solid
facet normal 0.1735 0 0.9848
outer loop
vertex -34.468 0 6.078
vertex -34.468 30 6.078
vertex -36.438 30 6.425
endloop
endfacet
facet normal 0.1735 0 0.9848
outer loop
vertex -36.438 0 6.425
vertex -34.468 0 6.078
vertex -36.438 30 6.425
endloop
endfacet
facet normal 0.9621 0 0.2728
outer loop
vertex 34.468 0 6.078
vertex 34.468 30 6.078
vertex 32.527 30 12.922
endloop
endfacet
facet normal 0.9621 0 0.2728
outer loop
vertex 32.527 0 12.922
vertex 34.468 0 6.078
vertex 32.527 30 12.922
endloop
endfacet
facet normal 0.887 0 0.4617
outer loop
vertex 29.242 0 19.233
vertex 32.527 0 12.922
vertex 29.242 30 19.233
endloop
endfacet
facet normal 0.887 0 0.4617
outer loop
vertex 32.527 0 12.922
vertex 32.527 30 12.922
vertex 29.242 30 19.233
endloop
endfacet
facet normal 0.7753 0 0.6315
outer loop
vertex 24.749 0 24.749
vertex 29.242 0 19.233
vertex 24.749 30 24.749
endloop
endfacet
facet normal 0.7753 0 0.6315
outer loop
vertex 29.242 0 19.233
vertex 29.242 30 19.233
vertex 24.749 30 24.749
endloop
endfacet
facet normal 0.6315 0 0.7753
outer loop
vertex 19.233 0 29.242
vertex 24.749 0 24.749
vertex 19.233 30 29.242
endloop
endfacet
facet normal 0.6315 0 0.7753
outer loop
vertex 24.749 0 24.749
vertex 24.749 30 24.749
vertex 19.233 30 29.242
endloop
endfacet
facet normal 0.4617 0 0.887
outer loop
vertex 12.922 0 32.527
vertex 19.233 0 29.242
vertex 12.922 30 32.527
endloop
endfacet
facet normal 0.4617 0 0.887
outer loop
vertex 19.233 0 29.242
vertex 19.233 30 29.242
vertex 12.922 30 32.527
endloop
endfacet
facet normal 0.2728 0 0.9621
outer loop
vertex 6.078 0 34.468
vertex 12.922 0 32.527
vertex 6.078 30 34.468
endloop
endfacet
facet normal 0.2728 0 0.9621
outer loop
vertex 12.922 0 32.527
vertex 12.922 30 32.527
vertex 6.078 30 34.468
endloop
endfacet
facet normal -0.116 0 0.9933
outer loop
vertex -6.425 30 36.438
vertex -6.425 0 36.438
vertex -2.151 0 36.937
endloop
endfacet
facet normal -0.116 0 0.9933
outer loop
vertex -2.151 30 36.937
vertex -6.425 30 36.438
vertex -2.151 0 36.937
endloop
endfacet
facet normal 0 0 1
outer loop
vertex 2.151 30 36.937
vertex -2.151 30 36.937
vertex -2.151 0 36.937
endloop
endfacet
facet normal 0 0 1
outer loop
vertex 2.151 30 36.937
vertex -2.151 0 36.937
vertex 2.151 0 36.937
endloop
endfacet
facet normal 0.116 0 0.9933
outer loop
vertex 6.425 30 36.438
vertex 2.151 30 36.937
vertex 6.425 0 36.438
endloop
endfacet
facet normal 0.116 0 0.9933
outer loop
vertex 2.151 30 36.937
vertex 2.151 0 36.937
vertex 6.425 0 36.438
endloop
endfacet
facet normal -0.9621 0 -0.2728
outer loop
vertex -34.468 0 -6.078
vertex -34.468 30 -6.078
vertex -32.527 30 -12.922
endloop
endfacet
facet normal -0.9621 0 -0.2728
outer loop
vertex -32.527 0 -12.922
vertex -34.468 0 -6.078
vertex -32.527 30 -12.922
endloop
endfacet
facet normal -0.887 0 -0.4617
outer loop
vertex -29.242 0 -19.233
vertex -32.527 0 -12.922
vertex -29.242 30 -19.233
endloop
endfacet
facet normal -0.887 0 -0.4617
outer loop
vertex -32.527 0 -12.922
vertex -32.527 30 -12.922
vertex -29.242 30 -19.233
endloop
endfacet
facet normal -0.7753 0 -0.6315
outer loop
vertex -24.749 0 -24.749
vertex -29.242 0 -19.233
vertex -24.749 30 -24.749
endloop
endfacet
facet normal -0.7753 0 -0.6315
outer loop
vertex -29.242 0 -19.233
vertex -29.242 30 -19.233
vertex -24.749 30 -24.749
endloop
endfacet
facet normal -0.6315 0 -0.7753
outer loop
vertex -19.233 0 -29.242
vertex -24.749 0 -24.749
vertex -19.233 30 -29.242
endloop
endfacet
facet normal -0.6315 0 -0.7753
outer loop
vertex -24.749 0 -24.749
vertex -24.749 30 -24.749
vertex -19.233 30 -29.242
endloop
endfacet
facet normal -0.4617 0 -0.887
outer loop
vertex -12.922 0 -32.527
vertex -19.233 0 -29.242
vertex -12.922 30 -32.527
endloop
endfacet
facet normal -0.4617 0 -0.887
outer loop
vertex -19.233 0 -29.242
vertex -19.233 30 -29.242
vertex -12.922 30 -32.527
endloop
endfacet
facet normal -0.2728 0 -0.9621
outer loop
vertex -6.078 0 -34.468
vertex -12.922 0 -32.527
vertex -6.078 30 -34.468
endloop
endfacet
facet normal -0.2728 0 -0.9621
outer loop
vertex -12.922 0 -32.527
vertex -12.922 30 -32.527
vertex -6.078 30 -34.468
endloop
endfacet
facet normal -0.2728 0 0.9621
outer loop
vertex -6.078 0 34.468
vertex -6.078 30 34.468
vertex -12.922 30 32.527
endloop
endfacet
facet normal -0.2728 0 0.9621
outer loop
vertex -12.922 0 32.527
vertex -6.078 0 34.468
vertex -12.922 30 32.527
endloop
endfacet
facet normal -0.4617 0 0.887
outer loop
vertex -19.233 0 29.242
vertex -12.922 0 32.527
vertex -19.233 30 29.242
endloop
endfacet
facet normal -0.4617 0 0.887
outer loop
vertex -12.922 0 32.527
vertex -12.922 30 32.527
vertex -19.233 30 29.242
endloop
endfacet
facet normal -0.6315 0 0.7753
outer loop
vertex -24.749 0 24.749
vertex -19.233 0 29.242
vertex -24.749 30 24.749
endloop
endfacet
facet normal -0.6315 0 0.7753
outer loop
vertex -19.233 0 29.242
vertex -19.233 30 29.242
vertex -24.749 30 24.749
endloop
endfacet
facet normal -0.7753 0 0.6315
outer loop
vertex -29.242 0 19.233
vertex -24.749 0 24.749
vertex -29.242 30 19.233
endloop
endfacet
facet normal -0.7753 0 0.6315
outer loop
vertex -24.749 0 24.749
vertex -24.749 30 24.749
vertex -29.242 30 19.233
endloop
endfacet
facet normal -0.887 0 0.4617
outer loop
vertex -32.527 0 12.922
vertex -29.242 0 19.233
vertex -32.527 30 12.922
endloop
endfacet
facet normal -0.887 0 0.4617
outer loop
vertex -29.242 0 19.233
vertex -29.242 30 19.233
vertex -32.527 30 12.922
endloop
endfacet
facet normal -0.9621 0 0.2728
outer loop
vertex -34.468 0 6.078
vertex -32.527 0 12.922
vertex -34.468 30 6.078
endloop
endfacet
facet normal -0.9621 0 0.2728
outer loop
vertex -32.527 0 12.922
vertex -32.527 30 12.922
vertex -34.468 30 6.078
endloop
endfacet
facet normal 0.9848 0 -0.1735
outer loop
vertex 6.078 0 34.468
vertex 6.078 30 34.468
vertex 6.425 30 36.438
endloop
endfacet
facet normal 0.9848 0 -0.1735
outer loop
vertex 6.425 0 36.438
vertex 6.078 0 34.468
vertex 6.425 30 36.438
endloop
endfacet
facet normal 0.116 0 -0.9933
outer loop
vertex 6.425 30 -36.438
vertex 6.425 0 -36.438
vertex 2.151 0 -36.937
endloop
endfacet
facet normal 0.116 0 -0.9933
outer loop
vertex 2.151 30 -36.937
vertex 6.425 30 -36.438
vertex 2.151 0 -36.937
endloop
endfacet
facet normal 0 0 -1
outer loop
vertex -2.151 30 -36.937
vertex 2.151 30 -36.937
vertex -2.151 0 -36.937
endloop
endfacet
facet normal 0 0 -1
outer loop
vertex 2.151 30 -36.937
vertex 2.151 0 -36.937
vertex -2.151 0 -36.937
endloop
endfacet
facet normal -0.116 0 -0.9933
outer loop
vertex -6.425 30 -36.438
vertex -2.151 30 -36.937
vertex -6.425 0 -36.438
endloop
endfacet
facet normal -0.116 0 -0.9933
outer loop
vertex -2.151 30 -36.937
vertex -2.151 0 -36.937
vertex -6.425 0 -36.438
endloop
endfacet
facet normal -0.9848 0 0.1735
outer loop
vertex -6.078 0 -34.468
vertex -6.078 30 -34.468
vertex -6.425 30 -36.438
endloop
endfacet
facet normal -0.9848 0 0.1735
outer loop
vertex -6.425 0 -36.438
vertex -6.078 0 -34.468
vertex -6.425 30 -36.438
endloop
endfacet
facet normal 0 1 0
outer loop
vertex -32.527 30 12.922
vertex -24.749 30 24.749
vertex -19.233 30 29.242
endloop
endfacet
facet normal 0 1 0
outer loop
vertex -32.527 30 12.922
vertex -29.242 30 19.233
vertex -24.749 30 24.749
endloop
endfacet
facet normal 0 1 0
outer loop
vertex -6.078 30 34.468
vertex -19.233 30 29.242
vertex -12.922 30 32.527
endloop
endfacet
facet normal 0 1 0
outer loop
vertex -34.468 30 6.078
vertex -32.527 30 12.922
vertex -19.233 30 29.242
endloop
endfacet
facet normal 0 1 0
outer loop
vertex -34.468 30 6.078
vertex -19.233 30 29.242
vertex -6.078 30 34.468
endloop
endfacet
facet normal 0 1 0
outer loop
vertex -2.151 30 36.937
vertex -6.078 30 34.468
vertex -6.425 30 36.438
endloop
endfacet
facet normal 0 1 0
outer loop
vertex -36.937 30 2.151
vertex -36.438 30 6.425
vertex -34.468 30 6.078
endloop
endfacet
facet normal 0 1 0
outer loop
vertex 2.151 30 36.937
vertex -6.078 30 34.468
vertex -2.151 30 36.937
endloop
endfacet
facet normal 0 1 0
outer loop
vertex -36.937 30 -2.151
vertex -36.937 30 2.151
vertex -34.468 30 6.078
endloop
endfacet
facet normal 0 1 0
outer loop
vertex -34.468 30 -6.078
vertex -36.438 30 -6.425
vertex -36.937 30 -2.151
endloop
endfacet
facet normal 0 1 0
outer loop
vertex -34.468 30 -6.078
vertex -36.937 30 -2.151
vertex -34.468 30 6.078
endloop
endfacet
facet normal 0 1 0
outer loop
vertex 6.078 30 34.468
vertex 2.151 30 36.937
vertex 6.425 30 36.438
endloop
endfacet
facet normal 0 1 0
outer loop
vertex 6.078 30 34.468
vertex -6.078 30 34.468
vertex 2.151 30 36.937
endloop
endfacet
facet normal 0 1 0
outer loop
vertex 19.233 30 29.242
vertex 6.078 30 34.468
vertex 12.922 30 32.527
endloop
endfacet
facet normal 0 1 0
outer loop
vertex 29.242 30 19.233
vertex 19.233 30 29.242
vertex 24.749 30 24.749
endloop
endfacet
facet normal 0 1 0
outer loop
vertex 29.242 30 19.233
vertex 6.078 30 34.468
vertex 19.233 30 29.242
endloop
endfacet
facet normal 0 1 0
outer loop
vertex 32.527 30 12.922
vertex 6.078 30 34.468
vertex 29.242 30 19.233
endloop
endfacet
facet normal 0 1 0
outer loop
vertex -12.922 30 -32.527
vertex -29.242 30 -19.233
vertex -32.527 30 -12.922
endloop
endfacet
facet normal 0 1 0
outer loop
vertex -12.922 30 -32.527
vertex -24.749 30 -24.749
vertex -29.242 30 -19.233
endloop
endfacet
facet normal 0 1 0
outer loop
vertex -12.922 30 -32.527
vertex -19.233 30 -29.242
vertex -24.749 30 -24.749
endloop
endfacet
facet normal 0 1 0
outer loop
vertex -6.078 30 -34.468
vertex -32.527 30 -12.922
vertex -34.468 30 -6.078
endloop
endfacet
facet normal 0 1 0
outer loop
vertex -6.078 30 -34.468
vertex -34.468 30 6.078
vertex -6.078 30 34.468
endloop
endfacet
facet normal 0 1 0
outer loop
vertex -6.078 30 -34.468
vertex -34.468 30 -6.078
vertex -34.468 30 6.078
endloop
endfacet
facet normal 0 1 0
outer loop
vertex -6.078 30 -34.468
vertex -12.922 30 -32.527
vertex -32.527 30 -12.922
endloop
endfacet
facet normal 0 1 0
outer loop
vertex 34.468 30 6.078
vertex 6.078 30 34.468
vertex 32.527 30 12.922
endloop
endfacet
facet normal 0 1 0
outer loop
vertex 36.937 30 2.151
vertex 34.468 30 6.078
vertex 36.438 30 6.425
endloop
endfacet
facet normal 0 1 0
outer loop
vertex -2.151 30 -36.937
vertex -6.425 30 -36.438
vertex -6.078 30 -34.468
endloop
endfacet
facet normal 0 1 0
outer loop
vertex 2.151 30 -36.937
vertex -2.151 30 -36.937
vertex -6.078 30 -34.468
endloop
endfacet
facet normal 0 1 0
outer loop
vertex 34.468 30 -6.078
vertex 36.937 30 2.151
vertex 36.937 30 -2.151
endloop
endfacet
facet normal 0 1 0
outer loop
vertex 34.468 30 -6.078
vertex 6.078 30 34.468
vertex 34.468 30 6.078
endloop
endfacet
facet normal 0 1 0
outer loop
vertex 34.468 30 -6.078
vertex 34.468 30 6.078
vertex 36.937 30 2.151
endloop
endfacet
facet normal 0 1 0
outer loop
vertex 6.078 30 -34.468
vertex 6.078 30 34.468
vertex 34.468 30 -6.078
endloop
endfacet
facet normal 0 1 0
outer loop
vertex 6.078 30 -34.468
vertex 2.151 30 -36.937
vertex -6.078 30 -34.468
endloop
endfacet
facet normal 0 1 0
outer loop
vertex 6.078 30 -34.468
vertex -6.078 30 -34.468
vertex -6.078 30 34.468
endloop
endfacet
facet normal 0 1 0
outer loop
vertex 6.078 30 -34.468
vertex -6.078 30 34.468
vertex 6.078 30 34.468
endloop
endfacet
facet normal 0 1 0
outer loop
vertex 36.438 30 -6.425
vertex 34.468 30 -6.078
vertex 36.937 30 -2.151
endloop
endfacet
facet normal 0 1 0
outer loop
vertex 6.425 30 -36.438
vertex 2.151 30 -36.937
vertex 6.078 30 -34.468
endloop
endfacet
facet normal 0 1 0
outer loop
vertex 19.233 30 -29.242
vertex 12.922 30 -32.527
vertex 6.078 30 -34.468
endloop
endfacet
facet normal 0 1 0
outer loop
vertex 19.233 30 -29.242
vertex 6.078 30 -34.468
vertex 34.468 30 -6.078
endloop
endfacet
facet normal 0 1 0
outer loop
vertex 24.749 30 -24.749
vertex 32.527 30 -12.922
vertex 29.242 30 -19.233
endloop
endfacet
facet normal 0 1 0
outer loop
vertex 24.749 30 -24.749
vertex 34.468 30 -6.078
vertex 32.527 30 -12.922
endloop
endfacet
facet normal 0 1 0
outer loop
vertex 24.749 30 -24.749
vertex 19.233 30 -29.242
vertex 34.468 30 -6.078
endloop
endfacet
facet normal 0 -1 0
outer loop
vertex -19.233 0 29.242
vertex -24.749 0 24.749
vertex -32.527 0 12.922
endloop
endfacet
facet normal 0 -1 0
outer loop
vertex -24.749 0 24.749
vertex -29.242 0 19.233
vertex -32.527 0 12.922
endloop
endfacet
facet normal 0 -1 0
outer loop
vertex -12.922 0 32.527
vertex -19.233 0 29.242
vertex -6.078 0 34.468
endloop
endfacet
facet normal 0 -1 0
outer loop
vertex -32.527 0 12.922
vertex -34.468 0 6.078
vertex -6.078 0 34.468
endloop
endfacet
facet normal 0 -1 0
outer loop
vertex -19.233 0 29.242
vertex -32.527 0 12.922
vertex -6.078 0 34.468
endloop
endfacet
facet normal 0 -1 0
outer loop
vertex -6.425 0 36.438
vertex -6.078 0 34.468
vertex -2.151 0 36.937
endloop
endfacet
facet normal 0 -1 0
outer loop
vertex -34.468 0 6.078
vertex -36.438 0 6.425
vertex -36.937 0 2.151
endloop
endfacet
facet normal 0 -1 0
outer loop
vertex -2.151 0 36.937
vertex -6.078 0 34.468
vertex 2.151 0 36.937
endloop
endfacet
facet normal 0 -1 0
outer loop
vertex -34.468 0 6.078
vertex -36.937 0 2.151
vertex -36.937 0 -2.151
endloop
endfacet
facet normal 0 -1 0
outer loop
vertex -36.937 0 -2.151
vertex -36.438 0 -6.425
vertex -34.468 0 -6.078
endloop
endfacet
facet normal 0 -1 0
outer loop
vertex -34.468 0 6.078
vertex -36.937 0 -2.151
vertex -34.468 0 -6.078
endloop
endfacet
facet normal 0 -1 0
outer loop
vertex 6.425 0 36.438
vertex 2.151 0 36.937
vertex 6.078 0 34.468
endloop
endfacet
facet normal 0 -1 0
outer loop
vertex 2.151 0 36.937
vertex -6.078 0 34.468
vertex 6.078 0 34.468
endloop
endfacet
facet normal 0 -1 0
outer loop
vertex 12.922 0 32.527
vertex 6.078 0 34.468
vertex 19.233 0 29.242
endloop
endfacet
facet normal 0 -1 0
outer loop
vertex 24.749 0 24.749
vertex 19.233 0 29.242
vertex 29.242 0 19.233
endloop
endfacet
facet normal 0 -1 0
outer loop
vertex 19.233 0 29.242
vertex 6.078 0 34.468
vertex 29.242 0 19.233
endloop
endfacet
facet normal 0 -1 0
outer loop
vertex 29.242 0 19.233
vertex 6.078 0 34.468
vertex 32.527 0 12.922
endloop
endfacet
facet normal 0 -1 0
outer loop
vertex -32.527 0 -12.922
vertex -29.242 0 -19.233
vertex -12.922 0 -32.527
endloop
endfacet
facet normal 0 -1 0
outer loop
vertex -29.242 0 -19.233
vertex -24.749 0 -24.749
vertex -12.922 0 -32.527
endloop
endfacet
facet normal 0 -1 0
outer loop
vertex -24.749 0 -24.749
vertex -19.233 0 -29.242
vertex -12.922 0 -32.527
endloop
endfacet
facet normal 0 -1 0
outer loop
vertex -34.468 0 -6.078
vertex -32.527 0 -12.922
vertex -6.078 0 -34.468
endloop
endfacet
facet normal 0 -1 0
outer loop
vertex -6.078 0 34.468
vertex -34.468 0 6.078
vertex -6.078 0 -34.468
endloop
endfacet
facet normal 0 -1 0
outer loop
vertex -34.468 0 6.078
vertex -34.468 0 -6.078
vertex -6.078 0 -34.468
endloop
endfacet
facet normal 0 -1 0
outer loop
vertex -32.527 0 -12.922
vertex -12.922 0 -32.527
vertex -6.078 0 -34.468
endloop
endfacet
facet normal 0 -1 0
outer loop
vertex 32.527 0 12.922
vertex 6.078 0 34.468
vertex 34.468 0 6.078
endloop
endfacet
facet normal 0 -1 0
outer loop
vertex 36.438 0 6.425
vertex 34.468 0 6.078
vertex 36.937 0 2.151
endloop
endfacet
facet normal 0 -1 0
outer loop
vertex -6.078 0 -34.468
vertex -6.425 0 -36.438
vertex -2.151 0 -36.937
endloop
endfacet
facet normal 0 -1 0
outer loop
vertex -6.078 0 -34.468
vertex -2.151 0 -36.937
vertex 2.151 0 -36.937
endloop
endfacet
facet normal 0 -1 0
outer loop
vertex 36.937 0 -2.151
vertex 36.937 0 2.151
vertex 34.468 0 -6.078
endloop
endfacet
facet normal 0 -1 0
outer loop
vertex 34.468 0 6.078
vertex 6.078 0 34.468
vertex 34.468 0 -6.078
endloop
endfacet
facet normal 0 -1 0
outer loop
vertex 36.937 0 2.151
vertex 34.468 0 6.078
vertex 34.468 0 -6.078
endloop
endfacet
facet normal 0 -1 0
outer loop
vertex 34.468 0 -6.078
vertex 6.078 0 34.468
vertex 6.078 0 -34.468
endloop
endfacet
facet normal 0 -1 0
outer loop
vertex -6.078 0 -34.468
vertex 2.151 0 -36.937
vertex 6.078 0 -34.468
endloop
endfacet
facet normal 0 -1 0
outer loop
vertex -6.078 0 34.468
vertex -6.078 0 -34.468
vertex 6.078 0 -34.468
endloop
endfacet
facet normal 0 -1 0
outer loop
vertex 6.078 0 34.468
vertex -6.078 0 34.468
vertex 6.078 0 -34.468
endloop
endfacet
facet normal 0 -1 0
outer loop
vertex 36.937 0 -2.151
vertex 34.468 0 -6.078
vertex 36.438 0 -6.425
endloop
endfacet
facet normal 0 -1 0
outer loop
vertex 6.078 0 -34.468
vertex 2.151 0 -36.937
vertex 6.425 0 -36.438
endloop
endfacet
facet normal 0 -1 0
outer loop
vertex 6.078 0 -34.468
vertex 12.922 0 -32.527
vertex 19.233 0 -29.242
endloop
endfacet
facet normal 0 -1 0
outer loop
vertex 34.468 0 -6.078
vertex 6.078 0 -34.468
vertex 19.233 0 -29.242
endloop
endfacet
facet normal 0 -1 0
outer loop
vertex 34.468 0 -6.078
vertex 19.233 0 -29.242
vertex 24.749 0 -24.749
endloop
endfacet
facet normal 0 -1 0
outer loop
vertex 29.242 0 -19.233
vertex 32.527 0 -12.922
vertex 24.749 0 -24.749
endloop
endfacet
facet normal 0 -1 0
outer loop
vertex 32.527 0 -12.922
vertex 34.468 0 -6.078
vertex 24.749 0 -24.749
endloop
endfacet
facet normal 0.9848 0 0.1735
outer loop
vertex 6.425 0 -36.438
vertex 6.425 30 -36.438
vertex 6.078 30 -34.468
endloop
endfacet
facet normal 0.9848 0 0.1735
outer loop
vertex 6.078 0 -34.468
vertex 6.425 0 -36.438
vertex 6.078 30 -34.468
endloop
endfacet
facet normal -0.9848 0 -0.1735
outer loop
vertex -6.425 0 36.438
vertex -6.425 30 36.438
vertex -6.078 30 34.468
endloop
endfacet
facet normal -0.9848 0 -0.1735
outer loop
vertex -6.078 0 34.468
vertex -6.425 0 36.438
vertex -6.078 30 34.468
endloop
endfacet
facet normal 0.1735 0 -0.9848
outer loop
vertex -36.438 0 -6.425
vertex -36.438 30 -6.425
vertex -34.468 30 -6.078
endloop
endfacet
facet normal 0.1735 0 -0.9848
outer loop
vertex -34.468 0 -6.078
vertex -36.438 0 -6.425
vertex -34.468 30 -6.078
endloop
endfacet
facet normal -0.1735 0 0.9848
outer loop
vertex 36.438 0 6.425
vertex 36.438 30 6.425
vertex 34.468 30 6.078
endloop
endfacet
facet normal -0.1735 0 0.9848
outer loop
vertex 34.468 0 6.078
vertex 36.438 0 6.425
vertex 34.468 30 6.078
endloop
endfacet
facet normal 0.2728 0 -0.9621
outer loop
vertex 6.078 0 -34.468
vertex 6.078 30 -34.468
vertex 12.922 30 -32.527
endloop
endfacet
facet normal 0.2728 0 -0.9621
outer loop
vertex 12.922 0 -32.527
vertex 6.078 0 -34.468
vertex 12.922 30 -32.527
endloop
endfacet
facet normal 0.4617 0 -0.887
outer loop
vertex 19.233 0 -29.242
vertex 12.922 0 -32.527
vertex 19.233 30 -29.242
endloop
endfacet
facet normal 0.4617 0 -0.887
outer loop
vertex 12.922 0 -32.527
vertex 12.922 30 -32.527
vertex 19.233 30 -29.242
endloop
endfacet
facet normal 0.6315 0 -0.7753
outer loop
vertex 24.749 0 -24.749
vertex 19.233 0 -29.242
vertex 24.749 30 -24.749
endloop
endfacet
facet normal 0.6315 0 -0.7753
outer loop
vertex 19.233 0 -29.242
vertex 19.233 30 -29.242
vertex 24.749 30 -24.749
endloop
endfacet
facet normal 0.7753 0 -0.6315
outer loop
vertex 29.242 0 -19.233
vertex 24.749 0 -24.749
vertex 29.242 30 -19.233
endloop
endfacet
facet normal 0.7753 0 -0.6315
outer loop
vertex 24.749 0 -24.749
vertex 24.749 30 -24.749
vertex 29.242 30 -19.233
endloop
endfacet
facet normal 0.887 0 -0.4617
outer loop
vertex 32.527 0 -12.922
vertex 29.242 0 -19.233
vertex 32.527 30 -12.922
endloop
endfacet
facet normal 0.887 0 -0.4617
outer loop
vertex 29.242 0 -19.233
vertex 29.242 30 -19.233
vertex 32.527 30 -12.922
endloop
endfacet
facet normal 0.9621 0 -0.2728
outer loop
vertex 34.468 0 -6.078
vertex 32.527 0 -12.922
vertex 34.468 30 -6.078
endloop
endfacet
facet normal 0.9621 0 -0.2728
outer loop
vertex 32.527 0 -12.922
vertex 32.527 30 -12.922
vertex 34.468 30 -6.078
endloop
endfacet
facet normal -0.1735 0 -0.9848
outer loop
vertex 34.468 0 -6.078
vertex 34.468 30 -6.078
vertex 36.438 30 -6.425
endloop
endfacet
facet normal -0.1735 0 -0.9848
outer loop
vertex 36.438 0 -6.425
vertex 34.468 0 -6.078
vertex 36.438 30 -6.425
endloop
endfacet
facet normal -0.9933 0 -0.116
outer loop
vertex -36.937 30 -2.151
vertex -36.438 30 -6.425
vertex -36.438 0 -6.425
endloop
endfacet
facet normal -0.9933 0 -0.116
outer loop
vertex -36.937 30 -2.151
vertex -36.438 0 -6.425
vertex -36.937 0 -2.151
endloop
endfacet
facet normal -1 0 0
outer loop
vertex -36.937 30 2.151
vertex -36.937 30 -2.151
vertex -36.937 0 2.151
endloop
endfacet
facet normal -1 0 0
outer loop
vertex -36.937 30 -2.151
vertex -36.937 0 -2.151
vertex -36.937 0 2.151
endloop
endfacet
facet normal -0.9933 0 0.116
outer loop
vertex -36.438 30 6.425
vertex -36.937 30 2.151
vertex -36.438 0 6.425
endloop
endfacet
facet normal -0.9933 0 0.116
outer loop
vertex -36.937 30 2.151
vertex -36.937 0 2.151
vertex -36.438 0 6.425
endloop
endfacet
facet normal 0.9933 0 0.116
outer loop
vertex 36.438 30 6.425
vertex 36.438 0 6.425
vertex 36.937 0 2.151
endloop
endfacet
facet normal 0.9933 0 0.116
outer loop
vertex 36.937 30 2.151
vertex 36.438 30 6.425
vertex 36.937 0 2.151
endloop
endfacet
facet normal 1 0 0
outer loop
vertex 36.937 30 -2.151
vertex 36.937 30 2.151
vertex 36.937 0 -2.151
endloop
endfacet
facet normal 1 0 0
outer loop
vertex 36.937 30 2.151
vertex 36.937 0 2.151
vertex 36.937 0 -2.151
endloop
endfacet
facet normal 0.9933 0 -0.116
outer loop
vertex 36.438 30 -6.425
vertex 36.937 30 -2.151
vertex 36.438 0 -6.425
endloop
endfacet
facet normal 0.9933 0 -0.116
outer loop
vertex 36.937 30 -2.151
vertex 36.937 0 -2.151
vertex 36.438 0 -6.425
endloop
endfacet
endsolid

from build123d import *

# Parameters (mm, degrees)
SKETCH1_R           = 37
BOSS_EXTRUDE1_DEPTH = 30
CUT_EXTRUDE1_DEPTH  = 30


with BuildPart() as part:
    # Sketch1 → Boss-Extrude1 (new body)
    with BuildSketch(Plane(origin=(0, 0, 0), x_dir=(1, 0, 0), z_dir=(0, 1, 0))):
        Circle(SKETCH1_R)
    extrude(amount=BOSS_EXTRUDE1_DEPTH)

    # Sketch2 → Cut-Extrude1 (cut)
    with BuildSketch(Plane(origin=(0, 30, 0), x_dir=(1, 0, 0), z_dir=(0, 1, 0))):
        with BuildLine():
            Line((6.424982574, 36.437886861), (6.077686218, 34.468271355))
            ThreePointArc((6.077686218, 34.468271355), (24.748737342, 24.748737342), (34.468271355, 6.077686218))
            Line((34.468271355, 6.077686218), (36.437886861, 6.424982574))
            ThreePointArc((36.437886861, 6.424982574), (26.162950904, 26.162950904), (6.424982574, 36.437886861))
        make_face()
        with BuildLine():
            Line((36.437886861, -6.424982574), (34.468271355, -6.077686218))
            ThreePointArc((34.468271355, -6.077686218), (24.748737342, -24.748737342), (6.077686218, -34.468271355))
            Line((6.077686218, -34.468271355), (6.424982574, -36.437886861))
            ThreePointArc((6.424982574, -36.437886861), (26.162950904, -26.162950904), (36.437886861, -6.424982574))
        make_face()
        with BuildLine():
            Line((-6.424982574, -36.437886861), (-6.077686218, -34.468271355))
            ThreePointArc((-6.077686218, -34.468271355), (-24.748737342, -24.748737342), (-34.468271355, -6.077686218))
            Line((-34.468271355, -6.077686218), (-36.437886861, -6.424982574))
            ThreePointArc((-36.437886861, -6.424982574), (-26.162950904, -26.162950904), (-6.424982574, -36.437886861))
        make_face()
        with BuildLine():
            Line((-36.437886861, 6.424982574), (-34.468271355, 6.077686218))
            ThreePointArc((-34.468271355, 6.077686218), (-24.748737342, 24.748737342), (-6.077686218, 34.468271355))
            Line((-6.077686218, 34.468271355), (-6.424982574, 36.437886861))
            ThreePointArc((-6.424982574, 36.437886861), (-26.162950904, 26.162950904), (-36.437886861, 6.424982574))
        make_face()
    extrude(amount=-CUT_EXTRUDE1_DEPTH, mode=Mode.SUBTRACT)


solid = part.part
